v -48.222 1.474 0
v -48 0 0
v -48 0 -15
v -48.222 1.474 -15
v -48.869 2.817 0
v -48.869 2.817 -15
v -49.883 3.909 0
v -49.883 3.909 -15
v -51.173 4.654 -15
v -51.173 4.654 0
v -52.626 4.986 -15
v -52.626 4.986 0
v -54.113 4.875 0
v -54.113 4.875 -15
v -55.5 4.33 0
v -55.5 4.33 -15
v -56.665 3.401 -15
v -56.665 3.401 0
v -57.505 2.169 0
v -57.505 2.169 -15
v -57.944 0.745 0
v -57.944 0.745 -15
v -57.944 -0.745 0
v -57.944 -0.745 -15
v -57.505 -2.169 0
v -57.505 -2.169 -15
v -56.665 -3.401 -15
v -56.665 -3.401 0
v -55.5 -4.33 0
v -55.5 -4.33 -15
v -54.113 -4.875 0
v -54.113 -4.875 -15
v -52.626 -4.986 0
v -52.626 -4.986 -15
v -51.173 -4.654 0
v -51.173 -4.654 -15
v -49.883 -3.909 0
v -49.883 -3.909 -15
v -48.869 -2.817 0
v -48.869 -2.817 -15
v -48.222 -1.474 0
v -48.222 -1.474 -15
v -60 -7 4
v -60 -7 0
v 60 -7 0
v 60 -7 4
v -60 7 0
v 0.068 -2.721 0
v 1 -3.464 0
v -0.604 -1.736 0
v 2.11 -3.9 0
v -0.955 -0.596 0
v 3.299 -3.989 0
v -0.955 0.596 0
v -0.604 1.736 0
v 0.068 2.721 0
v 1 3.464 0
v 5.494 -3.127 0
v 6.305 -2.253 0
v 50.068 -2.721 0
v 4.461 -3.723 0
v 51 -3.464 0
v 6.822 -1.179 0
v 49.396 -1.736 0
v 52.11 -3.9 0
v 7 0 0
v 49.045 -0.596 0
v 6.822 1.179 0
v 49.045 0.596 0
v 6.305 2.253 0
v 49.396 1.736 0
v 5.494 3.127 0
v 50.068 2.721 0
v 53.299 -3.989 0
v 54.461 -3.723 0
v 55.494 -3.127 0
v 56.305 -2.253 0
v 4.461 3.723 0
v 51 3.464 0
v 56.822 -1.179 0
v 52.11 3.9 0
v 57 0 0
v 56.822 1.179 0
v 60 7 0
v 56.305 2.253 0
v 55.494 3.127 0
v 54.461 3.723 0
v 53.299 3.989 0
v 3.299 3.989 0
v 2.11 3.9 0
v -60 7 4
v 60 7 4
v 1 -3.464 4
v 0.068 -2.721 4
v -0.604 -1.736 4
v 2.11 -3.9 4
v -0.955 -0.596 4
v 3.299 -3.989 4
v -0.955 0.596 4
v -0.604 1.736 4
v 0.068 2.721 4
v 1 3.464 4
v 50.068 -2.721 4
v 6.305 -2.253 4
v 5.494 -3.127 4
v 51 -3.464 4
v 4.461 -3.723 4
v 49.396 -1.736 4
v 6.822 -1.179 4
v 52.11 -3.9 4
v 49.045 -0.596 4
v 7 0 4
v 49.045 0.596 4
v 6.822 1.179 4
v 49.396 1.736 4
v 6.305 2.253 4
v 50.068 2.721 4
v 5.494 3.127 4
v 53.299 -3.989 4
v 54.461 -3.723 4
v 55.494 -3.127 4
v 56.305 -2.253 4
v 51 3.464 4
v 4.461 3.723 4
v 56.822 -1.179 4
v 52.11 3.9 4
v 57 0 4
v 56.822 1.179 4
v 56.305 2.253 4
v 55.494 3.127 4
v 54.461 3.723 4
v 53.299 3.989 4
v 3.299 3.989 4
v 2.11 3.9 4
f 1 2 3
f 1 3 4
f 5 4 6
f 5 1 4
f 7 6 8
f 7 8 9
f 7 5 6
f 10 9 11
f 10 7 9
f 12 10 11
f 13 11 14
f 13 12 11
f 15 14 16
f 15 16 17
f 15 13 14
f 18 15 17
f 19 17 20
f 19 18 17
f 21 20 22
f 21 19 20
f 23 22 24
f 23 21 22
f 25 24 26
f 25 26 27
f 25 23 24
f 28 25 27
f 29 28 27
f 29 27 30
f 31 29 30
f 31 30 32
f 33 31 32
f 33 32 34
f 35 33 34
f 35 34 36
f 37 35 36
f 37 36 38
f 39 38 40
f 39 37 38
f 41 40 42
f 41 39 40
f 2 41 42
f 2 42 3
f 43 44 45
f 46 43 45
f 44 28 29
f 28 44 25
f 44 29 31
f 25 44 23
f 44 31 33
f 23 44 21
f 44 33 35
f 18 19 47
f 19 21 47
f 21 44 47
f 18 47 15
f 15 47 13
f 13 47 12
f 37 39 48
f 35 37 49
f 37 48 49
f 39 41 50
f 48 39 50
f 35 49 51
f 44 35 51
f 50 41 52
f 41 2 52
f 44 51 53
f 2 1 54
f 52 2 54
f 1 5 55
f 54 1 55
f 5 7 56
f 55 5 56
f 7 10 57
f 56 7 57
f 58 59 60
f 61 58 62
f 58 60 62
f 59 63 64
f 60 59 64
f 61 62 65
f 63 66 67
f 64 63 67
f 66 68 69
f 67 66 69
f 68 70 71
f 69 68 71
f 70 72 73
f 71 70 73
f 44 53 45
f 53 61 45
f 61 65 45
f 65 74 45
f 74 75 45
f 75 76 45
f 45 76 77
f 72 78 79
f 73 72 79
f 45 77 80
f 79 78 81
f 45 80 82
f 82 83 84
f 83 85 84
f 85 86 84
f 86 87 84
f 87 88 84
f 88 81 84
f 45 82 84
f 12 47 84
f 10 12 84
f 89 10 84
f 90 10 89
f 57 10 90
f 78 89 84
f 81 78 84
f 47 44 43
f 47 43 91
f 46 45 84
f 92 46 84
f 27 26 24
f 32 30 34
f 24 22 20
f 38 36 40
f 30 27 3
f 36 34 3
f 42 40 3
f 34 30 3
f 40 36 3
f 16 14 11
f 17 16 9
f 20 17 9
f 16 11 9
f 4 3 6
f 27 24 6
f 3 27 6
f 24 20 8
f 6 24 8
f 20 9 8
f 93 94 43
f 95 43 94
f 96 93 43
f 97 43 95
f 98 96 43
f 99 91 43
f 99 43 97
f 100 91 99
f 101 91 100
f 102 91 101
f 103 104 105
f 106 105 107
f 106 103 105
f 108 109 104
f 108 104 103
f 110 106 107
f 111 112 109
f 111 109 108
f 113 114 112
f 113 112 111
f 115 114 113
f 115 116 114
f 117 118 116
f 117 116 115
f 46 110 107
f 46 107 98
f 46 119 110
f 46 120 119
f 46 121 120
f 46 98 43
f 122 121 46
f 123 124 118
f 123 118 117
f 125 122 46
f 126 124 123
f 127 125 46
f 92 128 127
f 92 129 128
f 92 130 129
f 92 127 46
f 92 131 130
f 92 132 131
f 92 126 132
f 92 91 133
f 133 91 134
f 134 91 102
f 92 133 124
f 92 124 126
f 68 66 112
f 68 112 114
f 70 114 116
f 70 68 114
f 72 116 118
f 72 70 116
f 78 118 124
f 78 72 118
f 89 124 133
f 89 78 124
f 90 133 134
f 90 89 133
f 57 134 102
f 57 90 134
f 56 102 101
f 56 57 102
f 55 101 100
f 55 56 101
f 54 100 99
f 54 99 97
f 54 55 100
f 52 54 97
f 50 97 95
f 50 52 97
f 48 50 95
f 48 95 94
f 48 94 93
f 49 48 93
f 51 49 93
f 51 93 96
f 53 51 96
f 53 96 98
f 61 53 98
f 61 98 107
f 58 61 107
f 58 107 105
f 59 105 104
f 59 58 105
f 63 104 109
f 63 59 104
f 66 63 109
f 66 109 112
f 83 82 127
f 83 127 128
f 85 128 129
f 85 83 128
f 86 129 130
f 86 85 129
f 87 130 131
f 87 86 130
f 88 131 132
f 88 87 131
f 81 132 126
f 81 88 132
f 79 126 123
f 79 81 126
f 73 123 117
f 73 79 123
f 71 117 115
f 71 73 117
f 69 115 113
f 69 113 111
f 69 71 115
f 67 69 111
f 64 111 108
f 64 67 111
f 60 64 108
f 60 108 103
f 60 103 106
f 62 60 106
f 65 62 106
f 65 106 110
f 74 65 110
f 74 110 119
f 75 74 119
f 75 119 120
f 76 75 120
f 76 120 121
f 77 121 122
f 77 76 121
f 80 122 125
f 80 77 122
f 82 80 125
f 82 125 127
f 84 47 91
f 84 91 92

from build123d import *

# Parameters (mm, degrees)
F0_W     = 120
F0_H     = 14
F0_R     = 5
F0_R_2   = 4
F1_DEPTH = 4
F2_DEPTH = 15


with BuildPart() as f1:
    # F0 (on Top) → F1 (new body)
    with BuildSketch(Plane.XY):
        Rectangle(F0_W, F0_H)
        with Locations((-53, 0)):
            Circle(F0_R, mode=Mode.SUBTRACT)
        with Locations((3, 0)):
            Circle(F0_R_2, mode=Mode.SUBTRACT)
        with Locations((53, 0)):
            Circle(F0_R_2, mode=Mode.SUBTRACT)
        with Locations((-53, 0)):
            Circle(F0_R)
    extrude(amount=F1_DEPTH)

    # F0 (on Top) → F2 (join)
    with BuildSketch(Plane.XY):
        with Locations((-53, 0)):
            Circle(F0_R)
    extrude(amount=-F2_DEPTH)


solid = f1.part
